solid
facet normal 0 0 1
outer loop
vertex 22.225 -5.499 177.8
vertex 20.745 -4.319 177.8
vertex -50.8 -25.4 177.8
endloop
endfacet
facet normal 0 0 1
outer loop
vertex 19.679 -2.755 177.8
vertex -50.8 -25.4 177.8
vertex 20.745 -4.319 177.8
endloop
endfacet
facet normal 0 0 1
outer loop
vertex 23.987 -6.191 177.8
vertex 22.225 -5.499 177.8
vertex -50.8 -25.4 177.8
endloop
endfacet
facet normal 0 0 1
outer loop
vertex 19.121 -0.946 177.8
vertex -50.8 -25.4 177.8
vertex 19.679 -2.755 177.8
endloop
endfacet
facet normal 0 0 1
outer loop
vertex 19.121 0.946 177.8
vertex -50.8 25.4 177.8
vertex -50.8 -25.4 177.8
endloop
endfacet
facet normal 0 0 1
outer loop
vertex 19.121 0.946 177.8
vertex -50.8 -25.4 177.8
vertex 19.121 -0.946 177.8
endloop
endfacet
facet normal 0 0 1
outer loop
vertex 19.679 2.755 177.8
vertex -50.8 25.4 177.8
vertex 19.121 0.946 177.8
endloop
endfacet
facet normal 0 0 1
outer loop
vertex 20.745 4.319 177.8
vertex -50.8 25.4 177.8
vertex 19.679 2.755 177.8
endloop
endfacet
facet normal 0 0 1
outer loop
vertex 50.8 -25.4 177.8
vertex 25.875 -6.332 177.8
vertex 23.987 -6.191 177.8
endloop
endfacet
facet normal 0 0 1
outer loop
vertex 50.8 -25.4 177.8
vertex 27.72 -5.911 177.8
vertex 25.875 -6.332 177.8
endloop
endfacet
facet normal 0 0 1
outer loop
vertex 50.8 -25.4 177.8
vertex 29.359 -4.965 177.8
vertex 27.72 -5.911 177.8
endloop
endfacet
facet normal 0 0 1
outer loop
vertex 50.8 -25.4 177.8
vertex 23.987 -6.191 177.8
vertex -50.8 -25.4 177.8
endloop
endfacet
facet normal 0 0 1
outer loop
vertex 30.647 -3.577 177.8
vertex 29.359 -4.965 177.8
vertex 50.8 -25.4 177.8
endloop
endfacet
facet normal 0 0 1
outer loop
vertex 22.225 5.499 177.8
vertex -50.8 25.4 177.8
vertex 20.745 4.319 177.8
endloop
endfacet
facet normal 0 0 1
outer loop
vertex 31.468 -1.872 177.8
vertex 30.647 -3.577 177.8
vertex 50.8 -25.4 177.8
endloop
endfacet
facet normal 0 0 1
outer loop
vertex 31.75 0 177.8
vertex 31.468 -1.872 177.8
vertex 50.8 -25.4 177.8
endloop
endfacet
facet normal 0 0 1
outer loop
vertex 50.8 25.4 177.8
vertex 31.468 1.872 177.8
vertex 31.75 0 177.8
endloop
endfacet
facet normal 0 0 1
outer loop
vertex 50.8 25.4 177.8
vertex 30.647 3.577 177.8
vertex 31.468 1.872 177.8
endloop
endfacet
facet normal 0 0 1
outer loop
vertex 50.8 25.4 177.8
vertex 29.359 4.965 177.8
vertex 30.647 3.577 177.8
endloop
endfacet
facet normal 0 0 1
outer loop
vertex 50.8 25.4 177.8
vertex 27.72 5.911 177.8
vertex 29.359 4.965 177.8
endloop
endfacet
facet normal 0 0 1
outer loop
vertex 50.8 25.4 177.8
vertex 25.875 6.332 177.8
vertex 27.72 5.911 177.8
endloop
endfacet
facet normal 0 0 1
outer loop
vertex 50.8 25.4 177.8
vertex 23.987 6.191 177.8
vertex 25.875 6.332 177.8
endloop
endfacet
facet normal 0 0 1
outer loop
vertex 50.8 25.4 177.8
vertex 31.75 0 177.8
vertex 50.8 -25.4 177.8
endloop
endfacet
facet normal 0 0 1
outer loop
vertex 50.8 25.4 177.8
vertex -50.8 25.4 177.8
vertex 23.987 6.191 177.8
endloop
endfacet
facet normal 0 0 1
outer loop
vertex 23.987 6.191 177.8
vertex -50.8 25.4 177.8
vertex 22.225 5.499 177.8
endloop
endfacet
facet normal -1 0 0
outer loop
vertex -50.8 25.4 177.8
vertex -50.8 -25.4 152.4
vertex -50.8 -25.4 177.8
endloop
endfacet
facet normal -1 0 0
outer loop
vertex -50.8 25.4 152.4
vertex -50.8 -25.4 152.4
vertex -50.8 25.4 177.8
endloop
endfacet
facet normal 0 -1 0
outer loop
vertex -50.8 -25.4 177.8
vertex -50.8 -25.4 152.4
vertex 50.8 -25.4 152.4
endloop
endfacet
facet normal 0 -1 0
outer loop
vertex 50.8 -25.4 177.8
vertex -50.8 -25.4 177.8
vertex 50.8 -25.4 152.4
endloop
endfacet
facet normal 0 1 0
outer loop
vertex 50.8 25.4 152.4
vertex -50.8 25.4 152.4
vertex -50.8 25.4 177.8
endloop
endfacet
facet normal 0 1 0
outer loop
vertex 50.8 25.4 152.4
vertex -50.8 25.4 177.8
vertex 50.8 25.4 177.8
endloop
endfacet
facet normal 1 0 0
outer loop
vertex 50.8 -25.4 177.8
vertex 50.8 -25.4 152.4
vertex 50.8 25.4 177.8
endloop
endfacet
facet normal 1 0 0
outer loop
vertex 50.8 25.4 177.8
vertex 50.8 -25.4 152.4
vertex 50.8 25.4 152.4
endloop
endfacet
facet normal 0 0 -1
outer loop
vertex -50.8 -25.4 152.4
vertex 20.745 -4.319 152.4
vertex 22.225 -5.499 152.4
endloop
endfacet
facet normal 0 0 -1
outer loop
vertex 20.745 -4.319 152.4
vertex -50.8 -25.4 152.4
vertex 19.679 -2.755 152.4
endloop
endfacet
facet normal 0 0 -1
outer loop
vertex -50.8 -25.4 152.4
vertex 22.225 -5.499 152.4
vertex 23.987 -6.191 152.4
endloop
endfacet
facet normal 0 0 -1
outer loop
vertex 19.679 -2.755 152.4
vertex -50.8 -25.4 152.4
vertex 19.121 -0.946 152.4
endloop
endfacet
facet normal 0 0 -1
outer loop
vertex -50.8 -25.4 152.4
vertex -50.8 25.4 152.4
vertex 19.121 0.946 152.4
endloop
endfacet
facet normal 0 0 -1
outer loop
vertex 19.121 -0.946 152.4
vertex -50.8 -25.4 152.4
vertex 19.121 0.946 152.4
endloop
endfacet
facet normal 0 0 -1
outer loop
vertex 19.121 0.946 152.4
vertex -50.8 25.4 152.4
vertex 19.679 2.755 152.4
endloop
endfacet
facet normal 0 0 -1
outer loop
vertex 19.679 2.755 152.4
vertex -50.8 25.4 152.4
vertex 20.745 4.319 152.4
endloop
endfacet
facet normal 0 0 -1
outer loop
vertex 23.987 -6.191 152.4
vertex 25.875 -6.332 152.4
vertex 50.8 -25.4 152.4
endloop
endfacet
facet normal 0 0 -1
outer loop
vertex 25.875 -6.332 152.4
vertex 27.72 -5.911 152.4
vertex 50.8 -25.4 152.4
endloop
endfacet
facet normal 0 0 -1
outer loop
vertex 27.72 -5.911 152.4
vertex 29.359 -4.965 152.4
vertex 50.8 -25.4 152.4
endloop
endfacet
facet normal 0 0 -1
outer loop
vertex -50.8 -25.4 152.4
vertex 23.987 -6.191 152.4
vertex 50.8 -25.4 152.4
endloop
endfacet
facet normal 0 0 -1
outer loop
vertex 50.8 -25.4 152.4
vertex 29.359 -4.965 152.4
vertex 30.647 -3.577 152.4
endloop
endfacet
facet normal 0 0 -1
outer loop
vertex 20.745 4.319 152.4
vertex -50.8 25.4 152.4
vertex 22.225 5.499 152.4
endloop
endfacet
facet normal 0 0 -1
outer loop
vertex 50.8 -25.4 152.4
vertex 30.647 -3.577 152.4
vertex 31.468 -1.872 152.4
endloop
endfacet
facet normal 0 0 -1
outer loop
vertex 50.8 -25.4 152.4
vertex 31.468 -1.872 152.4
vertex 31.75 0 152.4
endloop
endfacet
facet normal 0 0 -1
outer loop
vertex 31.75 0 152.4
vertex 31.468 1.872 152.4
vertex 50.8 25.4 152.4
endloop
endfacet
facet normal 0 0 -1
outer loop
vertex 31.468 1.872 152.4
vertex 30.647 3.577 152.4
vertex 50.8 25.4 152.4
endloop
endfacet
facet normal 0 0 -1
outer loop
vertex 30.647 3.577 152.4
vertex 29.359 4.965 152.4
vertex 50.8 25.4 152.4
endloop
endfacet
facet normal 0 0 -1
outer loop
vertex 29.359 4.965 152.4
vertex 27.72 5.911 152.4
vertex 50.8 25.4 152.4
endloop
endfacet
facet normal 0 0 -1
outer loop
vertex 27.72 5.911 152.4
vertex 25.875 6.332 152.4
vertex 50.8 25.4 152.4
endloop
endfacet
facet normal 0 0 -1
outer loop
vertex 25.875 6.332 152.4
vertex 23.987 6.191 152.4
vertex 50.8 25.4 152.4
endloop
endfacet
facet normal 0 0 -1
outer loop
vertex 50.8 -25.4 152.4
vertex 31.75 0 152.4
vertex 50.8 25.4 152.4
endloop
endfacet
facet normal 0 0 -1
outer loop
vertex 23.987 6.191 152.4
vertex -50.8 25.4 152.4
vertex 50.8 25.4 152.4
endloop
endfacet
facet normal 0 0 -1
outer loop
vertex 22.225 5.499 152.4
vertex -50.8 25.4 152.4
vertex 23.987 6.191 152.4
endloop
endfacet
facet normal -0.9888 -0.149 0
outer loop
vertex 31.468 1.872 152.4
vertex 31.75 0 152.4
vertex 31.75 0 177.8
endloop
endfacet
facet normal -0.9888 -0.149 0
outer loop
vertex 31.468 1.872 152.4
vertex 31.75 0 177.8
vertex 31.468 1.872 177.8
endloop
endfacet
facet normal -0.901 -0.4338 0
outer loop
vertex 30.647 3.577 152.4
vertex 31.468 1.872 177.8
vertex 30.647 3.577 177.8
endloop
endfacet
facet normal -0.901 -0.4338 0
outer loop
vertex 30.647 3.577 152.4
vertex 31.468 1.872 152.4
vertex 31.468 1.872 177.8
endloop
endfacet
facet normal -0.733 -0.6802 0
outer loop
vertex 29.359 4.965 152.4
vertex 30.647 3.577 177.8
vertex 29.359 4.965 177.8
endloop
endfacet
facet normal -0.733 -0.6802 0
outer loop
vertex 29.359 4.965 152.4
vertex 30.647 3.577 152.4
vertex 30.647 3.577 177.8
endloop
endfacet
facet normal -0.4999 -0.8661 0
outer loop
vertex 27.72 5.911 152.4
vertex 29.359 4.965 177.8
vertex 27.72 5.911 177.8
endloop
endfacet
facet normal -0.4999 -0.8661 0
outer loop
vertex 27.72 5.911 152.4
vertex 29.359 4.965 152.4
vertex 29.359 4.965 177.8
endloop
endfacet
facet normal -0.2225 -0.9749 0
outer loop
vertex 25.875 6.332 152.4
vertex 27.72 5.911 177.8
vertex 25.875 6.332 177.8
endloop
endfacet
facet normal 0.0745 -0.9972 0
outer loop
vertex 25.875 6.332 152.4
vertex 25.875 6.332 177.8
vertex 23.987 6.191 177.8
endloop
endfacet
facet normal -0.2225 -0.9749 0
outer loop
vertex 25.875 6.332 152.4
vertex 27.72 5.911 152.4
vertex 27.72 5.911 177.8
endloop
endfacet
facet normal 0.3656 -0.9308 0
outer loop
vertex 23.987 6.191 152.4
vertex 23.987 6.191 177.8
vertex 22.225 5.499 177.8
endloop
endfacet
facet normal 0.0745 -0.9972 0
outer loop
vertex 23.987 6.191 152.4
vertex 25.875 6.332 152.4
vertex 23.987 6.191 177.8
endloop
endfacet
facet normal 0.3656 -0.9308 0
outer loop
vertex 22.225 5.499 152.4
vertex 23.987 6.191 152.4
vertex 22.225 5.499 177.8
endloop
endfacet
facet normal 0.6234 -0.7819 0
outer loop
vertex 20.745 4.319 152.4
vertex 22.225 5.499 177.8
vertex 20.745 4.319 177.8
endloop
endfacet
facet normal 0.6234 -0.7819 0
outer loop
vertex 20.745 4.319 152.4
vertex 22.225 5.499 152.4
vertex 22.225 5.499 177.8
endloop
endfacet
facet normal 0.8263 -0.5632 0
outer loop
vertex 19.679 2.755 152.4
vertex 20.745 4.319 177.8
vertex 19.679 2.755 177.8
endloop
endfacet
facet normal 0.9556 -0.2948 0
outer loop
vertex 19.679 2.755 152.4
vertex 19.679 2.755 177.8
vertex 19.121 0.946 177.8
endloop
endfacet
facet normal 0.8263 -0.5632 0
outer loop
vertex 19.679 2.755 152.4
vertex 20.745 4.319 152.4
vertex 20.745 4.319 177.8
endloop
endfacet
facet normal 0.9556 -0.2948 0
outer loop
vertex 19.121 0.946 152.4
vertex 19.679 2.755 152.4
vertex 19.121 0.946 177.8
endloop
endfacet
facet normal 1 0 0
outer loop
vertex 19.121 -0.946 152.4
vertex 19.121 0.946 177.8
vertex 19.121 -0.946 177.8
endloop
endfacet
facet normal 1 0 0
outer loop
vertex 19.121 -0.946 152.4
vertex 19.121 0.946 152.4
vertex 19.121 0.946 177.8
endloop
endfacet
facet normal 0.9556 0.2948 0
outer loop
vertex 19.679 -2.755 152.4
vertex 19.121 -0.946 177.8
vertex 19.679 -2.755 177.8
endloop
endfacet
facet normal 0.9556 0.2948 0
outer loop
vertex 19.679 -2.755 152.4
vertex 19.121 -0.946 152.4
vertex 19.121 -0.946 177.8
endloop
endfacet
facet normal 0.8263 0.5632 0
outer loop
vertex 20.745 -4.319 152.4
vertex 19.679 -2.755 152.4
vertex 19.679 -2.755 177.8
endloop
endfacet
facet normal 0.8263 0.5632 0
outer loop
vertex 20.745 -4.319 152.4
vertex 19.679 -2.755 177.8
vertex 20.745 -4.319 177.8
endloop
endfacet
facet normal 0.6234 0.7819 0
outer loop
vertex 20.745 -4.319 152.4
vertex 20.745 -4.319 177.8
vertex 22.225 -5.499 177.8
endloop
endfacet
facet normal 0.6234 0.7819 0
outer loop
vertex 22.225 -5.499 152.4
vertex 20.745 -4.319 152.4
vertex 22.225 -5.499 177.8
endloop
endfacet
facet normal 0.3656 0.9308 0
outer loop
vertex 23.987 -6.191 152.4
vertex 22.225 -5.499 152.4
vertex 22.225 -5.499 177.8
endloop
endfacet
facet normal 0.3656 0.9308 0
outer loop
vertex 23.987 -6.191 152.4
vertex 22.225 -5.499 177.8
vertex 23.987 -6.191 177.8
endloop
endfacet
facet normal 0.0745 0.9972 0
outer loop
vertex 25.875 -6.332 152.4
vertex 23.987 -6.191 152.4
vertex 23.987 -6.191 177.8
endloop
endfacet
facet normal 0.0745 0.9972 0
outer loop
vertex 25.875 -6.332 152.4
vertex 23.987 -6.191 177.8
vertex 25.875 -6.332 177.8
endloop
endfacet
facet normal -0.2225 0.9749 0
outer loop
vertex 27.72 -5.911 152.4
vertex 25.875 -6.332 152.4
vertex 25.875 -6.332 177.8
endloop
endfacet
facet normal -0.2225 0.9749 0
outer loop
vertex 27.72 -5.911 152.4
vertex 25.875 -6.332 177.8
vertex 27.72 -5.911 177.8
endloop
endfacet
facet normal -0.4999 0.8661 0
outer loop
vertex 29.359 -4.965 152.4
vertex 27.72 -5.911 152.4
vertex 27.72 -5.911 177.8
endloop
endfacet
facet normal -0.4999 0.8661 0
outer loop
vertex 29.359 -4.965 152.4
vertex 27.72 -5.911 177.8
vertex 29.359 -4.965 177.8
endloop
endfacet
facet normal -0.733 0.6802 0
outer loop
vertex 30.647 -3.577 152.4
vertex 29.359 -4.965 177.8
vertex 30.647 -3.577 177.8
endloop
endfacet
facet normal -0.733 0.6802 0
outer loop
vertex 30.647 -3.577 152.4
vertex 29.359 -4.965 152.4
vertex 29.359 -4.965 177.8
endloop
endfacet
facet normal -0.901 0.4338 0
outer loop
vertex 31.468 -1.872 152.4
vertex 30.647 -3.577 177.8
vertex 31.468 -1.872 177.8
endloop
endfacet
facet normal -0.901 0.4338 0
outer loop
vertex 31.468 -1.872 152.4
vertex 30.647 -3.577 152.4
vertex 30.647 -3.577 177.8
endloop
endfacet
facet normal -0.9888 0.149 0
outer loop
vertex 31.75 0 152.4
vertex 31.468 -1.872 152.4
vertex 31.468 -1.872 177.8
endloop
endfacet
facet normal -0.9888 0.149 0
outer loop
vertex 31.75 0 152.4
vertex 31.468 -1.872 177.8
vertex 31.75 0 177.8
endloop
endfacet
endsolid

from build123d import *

# Parameters (mm, degrees)
F1_W     = 101.6
F1_H     = 50.8
F1_R     = 6.35
F2_DEPTH = 25.4


with BuildPart() as f2:
    # F1 (on offset) → F2 (new body)
    with BuildSketch(Plane.XY.offset(152.4)):
        Rectangle(F1_W, F1_H)
        with Locations((25.4, 0)):
            Circle(F1_R, mode=Mode.SUBTRACT)
    extrude(amount=F2_DEPTH)


solid = f2.part
